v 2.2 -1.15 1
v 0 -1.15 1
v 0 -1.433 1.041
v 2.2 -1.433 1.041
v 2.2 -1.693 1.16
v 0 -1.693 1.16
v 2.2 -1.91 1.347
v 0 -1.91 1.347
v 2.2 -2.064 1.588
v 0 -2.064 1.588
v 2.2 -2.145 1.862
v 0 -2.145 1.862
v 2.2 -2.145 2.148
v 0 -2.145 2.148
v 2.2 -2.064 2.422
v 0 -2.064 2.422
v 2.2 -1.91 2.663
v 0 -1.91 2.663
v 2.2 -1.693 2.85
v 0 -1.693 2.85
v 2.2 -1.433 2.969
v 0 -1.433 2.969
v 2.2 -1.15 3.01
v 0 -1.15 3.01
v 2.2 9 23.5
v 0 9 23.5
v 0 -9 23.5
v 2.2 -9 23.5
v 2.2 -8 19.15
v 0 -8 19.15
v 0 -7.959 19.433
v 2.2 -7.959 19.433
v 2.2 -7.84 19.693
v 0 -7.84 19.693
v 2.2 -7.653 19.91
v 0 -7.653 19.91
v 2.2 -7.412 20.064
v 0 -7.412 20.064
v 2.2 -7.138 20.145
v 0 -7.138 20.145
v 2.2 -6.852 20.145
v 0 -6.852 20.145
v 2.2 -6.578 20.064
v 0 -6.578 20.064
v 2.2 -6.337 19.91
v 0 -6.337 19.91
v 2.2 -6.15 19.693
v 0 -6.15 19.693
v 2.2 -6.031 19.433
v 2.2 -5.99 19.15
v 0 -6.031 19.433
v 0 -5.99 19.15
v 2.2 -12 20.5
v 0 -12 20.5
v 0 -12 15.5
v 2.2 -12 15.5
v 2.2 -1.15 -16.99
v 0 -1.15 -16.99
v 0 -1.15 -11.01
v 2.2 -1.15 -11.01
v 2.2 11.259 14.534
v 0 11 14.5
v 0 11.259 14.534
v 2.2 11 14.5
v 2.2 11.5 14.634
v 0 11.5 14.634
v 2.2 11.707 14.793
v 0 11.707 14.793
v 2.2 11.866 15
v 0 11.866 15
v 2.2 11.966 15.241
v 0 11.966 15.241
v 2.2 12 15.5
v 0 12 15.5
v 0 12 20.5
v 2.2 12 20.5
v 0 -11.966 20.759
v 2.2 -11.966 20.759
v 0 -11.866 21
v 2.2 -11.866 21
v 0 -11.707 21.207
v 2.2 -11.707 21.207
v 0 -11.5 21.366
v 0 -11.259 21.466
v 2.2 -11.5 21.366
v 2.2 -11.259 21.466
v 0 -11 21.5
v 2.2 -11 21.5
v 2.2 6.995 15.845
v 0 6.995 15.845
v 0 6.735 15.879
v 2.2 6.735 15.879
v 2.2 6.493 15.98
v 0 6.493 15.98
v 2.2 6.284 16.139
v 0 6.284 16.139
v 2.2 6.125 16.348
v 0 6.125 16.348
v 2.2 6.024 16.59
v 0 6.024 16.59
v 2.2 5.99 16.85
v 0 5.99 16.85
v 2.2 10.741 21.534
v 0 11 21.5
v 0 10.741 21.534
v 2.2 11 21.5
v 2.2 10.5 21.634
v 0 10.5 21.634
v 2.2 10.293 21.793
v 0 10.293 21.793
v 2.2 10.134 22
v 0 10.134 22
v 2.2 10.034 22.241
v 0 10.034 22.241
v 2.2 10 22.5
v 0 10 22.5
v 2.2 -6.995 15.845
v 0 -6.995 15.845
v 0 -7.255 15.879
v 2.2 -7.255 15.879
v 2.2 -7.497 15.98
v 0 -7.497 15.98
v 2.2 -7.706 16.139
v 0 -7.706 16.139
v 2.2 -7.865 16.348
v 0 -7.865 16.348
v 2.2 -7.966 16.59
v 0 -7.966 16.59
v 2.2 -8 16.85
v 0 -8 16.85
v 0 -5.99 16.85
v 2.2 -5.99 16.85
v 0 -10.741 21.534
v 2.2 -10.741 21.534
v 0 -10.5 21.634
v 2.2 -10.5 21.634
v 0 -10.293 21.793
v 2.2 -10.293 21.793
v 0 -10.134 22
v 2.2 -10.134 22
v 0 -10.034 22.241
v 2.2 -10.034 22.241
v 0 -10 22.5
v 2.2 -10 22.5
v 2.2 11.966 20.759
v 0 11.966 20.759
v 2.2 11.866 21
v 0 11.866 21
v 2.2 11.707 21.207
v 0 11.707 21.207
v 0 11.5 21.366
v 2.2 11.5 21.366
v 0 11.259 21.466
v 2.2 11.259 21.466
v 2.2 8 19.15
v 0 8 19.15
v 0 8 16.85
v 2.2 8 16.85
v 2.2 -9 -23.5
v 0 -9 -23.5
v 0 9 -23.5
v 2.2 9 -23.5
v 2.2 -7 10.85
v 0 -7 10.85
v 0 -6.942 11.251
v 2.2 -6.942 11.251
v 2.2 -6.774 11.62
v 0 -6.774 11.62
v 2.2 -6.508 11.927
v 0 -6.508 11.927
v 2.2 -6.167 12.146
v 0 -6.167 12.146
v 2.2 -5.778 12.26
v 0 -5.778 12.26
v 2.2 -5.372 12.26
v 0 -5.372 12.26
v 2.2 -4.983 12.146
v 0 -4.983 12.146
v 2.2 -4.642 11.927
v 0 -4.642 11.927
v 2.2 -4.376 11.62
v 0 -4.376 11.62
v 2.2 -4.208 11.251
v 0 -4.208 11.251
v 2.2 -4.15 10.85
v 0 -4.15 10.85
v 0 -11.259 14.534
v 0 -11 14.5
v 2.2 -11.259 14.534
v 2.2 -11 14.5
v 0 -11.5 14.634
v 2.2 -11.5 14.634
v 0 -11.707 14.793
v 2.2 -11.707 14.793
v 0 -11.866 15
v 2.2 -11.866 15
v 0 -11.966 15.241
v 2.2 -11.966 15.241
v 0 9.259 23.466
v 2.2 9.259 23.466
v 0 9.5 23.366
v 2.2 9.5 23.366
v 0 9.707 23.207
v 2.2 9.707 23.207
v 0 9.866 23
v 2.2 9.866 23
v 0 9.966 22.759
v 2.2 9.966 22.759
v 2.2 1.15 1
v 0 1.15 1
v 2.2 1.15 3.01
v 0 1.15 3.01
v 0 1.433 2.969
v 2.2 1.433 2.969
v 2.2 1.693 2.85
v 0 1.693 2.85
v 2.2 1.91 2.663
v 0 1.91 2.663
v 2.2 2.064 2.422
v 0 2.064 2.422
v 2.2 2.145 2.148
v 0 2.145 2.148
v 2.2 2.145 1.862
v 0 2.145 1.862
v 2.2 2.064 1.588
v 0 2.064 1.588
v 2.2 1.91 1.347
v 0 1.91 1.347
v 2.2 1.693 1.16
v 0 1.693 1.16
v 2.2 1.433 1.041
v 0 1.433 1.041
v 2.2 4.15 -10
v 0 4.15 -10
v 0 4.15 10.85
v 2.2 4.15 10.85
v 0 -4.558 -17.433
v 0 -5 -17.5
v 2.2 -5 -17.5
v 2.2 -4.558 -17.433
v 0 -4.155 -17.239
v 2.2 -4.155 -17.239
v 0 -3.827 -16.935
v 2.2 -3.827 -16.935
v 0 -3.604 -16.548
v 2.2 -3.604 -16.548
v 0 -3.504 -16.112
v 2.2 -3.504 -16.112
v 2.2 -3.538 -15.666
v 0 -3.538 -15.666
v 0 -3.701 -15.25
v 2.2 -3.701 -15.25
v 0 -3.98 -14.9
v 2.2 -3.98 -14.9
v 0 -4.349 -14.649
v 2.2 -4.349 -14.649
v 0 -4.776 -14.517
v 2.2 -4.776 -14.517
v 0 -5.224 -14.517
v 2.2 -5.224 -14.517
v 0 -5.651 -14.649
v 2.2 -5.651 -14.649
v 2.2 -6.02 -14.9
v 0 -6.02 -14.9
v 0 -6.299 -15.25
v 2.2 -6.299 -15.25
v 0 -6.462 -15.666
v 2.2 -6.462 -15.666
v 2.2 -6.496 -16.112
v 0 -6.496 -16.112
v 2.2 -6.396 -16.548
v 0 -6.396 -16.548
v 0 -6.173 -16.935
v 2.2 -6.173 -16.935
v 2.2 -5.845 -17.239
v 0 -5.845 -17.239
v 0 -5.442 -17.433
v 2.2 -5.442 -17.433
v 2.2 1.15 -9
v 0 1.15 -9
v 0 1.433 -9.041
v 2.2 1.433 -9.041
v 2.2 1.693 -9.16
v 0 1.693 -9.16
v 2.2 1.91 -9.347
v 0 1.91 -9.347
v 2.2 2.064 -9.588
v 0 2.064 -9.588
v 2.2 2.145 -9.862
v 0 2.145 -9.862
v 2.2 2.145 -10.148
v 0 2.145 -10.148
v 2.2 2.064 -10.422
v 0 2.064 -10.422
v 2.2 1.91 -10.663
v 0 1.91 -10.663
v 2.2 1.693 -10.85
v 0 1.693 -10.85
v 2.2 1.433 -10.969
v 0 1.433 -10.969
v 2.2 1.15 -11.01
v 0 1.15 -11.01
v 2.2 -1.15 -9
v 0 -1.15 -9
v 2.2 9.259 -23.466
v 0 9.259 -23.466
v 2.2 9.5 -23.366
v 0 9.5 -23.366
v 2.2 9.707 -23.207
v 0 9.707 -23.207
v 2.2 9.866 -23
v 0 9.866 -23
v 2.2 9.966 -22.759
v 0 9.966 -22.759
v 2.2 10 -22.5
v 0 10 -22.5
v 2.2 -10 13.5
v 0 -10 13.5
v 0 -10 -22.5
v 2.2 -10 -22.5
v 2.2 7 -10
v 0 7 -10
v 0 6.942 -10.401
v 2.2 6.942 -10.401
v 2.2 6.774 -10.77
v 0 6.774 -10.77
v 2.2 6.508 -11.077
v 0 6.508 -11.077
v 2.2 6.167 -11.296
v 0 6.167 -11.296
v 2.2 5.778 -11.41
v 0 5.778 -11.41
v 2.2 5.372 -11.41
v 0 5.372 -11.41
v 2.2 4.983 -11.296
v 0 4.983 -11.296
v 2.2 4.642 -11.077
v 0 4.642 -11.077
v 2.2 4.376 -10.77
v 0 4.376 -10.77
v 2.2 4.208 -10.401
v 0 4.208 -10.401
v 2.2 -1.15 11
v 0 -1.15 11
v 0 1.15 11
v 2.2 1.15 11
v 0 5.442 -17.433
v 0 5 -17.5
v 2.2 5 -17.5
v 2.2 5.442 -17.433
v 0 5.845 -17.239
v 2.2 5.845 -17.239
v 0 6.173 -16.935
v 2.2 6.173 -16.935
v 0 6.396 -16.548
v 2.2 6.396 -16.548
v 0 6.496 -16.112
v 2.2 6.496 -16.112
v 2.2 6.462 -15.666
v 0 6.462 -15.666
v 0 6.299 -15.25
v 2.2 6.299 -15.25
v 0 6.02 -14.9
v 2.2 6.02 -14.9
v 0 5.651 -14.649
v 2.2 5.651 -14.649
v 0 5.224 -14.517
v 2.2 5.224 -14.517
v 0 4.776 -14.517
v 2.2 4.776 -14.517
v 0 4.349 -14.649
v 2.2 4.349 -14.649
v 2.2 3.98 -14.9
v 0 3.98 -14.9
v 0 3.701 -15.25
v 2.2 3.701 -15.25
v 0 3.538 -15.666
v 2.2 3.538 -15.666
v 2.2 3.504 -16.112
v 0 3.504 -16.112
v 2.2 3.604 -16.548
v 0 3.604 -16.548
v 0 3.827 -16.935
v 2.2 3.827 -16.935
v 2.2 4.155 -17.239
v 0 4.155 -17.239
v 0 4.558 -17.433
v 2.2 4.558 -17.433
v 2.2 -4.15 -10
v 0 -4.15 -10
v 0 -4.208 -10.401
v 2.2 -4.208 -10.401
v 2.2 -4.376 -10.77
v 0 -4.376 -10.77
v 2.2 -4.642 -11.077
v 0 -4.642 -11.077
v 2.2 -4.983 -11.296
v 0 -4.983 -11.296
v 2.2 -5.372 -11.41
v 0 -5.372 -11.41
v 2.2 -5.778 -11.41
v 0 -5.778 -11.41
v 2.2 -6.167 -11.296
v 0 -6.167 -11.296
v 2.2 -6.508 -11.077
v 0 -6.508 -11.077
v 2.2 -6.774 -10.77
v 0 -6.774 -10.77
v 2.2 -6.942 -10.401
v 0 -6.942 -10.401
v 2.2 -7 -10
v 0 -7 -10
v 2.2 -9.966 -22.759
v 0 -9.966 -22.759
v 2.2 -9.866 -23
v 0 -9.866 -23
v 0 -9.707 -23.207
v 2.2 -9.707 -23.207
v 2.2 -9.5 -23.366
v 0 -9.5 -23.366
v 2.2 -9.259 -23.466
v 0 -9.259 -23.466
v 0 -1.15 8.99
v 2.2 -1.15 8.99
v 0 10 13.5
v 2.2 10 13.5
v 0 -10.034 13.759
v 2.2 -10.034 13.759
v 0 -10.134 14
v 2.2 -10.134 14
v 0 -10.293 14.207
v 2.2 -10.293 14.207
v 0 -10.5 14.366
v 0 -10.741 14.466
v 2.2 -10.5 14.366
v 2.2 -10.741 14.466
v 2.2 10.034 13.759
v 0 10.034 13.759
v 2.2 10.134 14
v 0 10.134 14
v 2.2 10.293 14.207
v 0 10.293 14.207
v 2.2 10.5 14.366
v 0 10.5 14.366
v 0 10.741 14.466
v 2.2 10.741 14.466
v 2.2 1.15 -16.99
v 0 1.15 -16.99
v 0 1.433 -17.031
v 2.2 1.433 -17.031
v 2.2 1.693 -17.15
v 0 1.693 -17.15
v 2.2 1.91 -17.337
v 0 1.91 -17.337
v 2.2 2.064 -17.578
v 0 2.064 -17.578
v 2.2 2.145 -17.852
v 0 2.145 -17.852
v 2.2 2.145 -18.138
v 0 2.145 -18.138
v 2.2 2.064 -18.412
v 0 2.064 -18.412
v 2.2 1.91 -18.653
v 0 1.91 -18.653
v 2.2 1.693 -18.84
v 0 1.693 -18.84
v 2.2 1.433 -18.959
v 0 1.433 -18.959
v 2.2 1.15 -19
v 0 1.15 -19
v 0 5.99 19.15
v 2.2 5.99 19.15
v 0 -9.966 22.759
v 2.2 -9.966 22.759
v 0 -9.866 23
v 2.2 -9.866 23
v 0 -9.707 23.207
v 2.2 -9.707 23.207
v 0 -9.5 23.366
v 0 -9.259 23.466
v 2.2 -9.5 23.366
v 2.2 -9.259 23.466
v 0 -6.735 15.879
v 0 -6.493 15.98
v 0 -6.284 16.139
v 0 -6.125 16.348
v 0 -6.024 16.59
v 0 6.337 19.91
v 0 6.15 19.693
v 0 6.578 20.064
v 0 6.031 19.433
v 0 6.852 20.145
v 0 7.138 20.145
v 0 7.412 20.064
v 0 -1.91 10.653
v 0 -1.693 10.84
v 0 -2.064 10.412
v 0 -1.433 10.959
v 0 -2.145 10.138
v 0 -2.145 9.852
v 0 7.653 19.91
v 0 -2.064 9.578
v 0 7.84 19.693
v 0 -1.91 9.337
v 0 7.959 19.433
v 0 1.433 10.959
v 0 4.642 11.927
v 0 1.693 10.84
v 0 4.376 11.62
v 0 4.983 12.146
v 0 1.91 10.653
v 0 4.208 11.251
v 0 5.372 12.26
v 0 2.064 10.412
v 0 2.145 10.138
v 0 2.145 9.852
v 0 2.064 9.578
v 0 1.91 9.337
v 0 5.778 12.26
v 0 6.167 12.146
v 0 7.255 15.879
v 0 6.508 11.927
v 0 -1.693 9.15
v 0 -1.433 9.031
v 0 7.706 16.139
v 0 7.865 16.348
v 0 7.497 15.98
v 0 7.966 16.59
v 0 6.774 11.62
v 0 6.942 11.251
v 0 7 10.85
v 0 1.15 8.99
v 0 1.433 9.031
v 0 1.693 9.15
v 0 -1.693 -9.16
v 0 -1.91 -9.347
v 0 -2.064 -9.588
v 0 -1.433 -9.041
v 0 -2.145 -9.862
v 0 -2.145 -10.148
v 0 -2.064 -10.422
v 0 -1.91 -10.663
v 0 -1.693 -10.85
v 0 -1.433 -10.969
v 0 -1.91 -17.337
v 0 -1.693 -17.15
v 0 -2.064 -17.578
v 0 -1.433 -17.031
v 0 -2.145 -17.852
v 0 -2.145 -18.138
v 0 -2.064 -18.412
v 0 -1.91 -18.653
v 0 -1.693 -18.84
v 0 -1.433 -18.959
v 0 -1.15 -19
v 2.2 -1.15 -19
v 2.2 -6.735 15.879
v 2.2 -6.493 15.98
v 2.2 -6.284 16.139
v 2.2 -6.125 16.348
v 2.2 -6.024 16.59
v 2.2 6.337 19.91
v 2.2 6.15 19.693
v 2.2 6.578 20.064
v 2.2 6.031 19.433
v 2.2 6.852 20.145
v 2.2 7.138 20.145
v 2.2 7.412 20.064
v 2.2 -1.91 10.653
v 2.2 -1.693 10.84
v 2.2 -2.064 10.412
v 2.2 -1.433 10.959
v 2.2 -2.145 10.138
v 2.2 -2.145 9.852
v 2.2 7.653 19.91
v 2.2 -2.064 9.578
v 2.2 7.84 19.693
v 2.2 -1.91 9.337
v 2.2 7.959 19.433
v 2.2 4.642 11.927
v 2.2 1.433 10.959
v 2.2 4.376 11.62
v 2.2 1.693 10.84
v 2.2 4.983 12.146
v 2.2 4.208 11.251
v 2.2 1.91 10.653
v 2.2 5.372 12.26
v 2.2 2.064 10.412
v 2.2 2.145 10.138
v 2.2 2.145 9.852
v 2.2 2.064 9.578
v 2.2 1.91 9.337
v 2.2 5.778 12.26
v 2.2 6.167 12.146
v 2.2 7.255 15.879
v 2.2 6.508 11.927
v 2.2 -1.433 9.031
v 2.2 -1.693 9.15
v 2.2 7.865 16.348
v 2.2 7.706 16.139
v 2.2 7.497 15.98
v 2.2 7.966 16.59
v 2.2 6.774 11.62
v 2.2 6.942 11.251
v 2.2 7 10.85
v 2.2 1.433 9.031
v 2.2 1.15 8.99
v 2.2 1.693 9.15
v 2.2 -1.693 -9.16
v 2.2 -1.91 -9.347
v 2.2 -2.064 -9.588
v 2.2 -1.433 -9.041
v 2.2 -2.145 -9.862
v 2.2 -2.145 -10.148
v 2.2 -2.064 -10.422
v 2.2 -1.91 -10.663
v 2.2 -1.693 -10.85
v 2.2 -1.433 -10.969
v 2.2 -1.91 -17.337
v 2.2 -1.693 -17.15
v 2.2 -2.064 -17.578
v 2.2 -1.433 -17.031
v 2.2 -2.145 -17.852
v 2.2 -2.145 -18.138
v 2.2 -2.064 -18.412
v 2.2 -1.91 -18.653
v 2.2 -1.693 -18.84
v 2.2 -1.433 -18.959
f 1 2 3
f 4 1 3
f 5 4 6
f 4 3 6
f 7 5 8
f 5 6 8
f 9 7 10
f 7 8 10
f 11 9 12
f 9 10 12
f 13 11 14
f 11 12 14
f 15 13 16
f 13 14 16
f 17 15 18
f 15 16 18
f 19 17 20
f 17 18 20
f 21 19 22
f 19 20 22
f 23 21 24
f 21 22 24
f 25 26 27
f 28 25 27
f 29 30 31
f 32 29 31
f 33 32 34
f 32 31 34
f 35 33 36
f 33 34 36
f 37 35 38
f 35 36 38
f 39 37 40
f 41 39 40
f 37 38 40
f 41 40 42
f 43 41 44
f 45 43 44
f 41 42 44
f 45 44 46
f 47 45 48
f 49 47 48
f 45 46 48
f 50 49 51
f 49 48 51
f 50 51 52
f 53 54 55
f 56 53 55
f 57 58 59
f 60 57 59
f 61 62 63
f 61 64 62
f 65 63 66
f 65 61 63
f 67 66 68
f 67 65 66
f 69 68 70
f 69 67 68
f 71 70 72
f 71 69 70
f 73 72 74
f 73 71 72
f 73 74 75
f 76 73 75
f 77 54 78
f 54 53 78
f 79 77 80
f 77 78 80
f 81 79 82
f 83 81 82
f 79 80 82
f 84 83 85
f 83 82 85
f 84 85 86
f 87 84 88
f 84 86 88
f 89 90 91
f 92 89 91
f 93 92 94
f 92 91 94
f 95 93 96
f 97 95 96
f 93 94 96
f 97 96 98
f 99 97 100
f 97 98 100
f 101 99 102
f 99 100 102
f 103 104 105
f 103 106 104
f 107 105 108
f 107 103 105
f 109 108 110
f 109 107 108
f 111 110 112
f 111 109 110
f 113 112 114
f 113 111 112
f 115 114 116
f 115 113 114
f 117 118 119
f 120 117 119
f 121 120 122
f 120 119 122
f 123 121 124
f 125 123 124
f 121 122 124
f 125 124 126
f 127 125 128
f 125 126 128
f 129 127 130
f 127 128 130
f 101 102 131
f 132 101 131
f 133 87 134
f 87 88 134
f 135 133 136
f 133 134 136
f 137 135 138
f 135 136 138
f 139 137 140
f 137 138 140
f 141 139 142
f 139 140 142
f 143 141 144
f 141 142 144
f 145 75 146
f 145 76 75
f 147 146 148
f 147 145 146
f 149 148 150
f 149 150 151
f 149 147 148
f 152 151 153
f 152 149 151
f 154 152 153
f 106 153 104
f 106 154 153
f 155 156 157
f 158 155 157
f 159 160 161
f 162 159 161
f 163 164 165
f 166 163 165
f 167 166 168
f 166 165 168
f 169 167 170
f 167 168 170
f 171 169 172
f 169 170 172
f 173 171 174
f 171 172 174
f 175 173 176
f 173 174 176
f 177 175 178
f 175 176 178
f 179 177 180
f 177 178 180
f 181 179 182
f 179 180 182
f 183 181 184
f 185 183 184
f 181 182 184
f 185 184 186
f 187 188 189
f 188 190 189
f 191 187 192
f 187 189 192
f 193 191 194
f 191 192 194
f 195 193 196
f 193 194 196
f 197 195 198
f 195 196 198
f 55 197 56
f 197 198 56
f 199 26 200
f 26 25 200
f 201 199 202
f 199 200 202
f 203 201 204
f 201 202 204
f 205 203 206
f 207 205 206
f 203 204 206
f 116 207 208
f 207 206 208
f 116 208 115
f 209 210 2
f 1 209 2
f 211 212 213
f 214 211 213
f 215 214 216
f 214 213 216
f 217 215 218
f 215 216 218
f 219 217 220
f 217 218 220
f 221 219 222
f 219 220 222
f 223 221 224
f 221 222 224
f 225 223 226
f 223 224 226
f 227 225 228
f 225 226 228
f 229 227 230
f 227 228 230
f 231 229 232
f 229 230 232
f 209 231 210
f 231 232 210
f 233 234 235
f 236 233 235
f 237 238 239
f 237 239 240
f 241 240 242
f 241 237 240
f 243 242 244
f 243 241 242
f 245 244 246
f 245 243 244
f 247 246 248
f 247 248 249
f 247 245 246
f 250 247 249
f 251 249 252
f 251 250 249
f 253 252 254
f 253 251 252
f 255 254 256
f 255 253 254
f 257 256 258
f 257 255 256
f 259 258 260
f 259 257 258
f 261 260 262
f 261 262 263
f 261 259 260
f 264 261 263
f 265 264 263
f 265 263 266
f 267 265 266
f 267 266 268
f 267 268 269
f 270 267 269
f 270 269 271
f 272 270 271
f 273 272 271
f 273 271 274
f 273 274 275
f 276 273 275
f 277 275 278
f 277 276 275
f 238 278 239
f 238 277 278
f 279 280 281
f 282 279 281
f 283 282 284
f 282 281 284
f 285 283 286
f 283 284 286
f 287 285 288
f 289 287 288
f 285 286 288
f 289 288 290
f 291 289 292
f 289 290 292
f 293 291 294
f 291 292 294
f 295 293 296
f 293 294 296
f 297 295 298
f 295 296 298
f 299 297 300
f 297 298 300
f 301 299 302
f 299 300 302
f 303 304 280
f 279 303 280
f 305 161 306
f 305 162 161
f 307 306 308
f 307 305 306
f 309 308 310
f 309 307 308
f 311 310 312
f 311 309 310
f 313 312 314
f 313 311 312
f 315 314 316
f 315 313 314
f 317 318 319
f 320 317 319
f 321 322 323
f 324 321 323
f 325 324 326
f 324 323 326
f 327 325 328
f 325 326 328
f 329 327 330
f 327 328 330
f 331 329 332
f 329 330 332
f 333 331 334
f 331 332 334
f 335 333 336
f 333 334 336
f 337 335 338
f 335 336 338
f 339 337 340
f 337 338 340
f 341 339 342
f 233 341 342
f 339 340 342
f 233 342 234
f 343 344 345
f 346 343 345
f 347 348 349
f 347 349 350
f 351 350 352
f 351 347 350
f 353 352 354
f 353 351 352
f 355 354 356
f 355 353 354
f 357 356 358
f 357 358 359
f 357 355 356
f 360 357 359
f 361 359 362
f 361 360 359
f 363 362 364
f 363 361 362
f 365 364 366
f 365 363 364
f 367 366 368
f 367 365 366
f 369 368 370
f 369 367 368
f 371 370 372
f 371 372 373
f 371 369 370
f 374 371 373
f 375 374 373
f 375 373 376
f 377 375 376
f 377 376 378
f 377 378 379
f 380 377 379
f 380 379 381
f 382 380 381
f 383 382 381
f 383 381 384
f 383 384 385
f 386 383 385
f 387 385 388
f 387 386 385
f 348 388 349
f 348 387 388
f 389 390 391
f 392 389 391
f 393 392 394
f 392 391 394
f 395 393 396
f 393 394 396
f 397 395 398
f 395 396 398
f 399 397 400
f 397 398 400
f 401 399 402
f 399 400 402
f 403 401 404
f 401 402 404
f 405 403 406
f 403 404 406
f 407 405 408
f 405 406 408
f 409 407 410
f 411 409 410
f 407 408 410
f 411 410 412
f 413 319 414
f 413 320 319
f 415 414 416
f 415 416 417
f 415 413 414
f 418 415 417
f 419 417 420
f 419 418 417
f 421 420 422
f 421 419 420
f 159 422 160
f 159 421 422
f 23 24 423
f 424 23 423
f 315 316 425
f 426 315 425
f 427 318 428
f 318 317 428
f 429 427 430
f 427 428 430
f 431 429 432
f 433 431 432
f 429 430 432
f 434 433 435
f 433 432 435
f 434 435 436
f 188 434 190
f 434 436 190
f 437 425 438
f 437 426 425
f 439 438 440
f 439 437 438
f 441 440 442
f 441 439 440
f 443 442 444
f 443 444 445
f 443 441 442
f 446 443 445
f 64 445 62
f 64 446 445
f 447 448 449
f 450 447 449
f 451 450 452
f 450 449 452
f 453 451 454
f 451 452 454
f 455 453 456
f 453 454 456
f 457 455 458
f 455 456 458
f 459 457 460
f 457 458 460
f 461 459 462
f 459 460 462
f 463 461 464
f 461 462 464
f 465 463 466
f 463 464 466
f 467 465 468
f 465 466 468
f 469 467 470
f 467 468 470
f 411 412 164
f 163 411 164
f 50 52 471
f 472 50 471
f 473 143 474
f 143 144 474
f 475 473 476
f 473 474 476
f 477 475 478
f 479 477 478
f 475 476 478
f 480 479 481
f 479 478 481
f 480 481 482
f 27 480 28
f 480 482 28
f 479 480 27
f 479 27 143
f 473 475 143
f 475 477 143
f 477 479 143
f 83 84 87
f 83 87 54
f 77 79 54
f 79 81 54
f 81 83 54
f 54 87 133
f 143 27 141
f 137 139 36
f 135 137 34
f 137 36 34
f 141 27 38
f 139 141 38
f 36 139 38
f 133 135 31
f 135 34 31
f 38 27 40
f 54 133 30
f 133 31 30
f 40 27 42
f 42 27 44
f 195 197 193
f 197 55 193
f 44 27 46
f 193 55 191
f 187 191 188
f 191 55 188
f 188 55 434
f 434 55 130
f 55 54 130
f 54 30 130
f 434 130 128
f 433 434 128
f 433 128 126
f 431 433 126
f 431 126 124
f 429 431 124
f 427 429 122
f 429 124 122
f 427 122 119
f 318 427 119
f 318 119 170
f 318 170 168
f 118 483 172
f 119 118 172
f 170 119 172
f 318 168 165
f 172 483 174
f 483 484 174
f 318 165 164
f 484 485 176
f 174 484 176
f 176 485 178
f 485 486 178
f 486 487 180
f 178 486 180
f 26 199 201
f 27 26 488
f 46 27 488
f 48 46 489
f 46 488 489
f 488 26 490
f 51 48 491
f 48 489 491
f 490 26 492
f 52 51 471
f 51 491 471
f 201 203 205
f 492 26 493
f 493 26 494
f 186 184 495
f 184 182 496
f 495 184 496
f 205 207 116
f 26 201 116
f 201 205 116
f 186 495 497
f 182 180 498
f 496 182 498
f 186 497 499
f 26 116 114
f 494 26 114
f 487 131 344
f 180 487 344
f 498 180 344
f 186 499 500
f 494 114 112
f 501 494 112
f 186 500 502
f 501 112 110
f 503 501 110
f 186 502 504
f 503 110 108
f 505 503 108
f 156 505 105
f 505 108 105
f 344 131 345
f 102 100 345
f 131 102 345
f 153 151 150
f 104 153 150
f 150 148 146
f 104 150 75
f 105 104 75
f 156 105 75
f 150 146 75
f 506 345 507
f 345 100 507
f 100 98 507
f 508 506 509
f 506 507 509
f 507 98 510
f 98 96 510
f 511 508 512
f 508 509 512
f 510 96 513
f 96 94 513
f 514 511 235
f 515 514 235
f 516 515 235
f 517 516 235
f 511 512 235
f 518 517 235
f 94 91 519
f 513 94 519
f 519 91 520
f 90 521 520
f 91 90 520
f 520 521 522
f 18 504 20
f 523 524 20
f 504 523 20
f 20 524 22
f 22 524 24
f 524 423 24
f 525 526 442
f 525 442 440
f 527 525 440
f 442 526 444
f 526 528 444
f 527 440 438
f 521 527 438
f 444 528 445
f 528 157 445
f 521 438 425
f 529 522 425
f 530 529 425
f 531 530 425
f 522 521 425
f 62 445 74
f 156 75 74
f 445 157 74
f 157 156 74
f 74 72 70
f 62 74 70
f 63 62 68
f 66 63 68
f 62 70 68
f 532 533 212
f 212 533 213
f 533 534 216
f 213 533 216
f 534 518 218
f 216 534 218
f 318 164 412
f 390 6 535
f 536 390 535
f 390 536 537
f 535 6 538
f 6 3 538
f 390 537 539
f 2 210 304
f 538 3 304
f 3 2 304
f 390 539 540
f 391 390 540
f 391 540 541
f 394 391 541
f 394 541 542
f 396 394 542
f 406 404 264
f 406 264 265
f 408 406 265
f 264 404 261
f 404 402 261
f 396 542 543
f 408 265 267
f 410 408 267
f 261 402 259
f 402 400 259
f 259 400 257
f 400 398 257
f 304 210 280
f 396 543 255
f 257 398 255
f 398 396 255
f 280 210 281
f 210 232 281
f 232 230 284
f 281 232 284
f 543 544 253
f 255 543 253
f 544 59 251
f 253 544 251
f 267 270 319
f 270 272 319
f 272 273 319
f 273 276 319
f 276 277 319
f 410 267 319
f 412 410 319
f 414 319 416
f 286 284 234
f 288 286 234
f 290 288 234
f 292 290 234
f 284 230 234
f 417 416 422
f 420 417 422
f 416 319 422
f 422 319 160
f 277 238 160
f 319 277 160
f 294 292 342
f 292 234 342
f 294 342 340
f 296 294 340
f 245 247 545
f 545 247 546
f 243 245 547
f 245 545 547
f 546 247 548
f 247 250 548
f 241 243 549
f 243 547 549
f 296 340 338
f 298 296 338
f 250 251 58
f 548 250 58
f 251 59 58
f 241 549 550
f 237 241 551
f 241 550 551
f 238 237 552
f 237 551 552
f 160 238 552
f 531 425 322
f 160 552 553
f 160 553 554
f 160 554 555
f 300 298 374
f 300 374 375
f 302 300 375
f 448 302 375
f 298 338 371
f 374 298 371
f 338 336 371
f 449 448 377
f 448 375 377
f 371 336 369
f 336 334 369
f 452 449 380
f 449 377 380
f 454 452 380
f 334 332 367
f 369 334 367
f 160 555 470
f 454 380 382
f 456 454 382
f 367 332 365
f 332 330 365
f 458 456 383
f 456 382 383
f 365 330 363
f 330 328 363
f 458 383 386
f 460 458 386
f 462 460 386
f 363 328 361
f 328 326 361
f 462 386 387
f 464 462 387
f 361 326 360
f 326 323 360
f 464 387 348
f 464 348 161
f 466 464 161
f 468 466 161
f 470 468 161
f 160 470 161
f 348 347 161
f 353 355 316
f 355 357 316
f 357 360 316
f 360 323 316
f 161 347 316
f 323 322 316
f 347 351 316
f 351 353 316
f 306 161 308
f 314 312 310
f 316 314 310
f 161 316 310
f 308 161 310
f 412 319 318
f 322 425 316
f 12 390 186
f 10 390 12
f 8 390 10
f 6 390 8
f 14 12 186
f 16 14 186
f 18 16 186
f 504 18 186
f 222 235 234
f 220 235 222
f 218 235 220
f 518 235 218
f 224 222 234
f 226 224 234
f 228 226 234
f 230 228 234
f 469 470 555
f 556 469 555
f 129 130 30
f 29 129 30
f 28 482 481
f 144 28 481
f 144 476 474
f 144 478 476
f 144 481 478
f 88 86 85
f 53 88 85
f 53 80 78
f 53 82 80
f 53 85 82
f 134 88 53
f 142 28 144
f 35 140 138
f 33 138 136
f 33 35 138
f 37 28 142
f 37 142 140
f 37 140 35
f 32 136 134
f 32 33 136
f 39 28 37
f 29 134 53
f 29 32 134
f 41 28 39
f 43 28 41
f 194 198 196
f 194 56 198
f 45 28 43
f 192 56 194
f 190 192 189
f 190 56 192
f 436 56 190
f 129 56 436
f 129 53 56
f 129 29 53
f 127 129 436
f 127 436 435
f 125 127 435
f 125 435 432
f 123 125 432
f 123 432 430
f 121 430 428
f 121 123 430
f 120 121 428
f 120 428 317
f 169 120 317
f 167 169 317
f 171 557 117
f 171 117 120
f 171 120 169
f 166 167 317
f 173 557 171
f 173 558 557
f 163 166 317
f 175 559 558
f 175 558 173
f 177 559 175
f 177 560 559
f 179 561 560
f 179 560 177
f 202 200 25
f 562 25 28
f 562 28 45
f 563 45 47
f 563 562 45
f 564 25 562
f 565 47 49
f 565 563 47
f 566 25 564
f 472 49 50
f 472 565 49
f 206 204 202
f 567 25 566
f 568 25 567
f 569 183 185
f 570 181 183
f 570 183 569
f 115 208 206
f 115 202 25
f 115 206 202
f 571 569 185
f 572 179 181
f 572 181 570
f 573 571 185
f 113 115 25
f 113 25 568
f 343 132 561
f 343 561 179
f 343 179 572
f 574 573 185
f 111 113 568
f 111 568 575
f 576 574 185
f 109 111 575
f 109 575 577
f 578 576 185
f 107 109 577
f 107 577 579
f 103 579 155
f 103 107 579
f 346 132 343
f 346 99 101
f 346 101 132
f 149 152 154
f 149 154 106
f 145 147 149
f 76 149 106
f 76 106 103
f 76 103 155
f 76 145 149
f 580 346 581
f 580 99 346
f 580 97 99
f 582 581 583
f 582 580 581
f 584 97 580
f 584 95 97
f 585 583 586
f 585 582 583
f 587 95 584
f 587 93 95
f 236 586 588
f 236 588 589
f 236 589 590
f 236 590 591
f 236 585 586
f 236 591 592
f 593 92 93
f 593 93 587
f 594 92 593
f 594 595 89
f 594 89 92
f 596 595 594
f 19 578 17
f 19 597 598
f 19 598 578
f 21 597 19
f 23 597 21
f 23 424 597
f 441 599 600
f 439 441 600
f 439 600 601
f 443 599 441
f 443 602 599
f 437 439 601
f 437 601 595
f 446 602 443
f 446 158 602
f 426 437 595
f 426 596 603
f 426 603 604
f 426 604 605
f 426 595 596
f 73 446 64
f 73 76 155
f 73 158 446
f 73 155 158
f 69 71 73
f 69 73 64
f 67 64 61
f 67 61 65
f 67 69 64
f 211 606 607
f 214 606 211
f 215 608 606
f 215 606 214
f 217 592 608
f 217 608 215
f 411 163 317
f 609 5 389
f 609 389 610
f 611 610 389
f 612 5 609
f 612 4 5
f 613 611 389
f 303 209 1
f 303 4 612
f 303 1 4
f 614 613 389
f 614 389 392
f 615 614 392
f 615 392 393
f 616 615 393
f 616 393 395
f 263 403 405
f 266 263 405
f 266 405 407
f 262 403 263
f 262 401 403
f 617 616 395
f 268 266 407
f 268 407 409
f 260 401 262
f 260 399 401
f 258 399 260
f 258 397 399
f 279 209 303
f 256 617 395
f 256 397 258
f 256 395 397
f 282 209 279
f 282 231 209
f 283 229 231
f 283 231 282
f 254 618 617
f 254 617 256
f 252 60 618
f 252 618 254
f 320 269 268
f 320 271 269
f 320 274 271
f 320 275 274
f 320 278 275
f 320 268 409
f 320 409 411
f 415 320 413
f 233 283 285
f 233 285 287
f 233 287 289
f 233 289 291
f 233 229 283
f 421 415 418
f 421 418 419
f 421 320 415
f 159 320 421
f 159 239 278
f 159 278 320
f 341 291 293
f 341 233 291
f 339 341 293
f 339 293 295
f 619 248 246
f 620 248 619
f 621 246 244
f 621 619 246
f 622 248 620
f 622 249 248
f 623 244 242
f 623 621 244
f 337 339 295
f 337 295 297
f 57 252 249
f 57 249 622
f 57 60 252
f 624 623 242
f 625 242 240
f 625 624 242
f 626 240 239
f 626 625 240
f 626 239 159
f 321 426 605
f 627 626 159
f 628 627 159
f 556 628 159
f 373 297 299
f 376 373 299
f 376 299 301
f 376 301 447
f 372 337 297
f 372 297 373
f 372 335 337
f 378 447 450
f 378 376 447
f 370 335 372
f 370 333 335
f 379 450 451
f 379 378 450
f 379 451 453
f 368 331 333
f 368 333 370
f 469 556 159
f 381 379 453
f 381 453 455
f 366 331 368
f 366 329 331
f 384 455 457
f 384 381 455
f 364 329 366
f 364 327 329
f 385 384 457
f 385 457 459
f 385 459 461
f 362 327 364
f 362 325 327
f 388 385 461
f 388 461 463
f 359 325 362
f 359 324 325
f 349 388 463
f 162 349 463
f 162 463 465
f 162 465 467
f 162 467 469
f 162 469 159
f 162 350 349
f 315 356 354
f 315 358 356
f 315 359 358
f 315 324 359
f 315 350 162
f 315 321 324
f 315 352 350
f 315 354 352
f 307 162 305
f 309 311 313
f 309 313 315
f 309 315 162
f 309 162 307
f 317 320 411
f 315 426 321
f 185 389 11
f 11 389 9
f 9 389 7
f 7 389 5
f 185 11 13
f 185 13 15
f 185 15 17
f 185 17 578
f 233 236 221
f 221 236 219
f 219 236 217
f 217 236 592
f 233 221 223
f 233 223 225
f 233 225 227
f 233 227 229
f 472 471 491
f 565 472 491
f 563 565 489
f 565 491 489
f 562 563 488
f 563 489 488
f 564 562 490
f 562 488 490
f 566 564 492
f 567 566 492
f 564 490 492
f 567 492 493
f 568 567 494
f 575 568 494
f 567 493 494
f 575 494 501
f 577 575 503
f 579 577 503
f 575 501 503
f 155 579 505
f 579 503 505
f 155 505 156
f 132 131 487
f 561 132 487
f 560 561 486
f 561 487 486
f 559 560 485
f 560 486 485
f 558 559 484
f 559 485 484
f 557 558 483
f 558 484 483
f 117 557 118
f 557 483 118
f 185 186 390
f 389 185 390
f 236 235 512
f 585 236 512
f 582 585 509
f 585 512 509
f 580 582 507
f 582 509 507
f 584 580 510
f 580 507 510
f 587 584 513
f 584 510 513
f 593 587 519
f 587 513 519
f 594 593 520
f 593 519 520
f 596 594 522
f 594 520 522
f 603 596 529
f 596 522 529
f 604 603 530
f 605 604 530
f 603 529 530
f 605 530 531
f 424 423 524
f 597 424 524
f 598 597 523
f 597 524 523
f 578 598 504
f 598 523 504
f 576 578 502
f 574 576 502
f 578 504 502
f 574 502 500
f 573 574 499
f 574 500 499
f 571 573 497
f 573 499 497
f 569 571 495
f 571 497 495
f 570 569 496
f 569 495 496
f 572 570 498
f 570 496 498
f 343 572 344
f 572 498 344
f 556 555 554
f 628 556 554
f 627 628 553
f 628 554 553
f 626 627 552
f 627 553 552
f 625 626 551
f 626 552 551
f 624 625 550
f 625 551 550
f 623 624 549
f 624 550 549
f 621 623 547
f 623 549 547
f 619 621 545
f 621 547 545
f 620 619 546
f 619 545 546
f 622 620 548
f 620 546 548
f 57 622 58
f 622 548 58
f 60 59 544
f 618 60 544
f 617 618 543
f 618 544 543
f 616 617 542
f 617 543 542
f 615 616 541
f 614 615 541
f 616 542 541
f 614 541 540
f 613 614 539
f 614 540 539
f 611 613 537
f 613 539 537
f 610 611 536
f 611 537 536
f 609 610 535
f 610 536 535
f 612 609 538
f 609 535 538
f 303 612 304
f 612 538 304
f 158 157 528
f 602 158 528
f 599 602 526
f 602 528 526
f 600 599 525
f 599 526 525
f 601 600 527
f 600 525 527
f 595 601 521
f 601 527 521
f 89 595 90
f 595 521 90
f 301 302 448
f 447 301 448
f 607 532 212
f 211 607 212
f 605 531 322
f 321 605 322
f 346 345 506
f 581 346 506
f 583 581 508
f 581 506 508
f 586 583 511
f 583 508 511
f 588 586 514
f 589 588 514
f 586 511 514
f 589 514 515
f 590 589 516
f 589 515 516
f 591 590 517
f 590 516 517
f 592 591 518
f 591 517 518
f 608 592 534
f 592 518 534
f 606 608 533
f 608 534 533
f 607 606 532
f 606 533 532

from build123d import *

# Parameters (mm, degrees)
SKETCH_1_R      = 1.5
EXTRUDE_1_DEPTH = 2.2
FILLET_1_R      = 1


with BuildPart() as part:
    # 草图1 → 凸台-拉伸1 (new body)
    with BuildSketch(Plane(origin=(0, 0, 0), x_dir=(0, 0, -1), z_dir=(1, 0, 0))):
        Polygon((-14.5, -10), (23.5, -10), (23.5, 10), (-14.5, 10), (-14.5, 12), (-21.5, 12), (-21.5, 10), (-23.5, 10), (-23.5, -10), (-21.5, -10), (-21.5, -12), (-14.5, -12), align=None)
        with BuildLine():
            ThreePointArc((-15.845, -6.995), (-16.139357685, -7.705642315), (-16.85, -8))
            Line((-16.85, -8), (-19.15, -8))
            ThreePointArc((-19.15, -8), (-20.155, -6.995), (-19.15, -5.99))
            Line((-19.15, -5.99), (-19.15, 5.99))
            ThreePointArc((-19.15, 5.99), (-20.155, 6.995), (-19.15, 8))
            Line((-19.15, 8), (-16.85, 8))
            ThreePointArc((-16.85, 8), (-16.139357685, 7.705642315), (-15.845, 6.995))
            ThreePointArc((-15.845, 6.995), (-16.139357685, 6.284357685), (-16.85, 5.99))
            Line((-16.85, 5.99), (-16.85, -5.99))
            ThreePointArc((-16.85, -5.99), (-16.139357685, -6.284357685), (-15.845, -6.995))
        make_face(mode=Mode.SUBTRACT)
        with BuildLine():
            Line((10, -7), (-10.85, -7))
            ThreePointArc((-10.85, -7), (-12.275, -5.575), (-10.85, -4.15))
            Line((-10.85, -4.15), (10, -4.15))
            ThreePointArc((10, -4.15), (11.425, -5.575), (10, -7))
        make_face(mode=Mode.SUBTRACT)
        with BuildLine():
            Line((-3.01, -1.15), (-8.99, -1.15))
            ThreePointArc((-8.99, -1.15), (-9.995, -2.155), (-11, -1.15))
            Line((-11, -1.15), (-11, 1.15))
            ThreePointArc((-11, 1.15), (-9.995, 2.155), (-8.99, 1.15))
            Line((-8.99, 1.15), (-3.01, 1.15))
            ThreePointArc((-3.01, 1.15), (-2.005, 2.155), (-1, 1.15))
            Line((-1, 1.15), (-1, -1.15))
            ThreePointArc((-1, -1.15), (-2.005, -2.155), (-3.01, -1.15))
        make_face(mode=Mode.SUBTRACT)
        with Locations((16, -5)):
            Circle(SKETCH_1_R, mode=Mode.SUBTRACT)
        with BuildLine():
            ThreePointArc((-10.85, 4.15), (-12.275, 5.575), (-10.85, 7))
            Line((-10.85, 7), (10, 7))
            ThreePointArc((10, 7), (11.425, 5.575), (10, 4.15))
            Line((10, 4.15), (-10.85, 4.15))
        make_face(mode=Mode.SUBTRACT)
        with BuildLine():
            Line((16.99, -1.15), (11.01, -1.15))
            ThreePointArc((11.01, -1.15), (10.005, -2.155), (9, -1.15))
            Line((9, -1.15), (9, 1.15))
            ThreePointArc((9, 1.15), (10.005, 2.155), (11.01, 1.15))
            Line((11.01, 1.15), (16.99, 1.15))
            ThreePointArc((16.99, 1.15), (17.995, 2.155), (19, 1.15))
            Line((19, 1.15), (19, -1.15))
            ThreePointArc((19, -1.15), (17.995, -2.155), (16.99, -1.15))
        make_face(mode=Mode.SUBTRACT)
        with Locations((16, 5)):
            Circle(SKETCH_1_R, mode=Mode.SUBTRACT)
    extrude(amount=EXTRUDE_1_DEPTH)

    # 圆角1
    fillet_1_edges = [part.edges().sort_by_distance(p)[0] for p in [
        (1.1, -10, 23.5),
        (1.1, 10, 23.5),
        (1.1, 12, 14.5),
        (1.1, 10, 14.5),
        (1.1, 10, -23.5),
        (1.1, -10, -23.5),
        (1.1, -10, 14.5),
        (1.1, -12, 14.5),
        (1.1, -12, 21.5),
        (1.1, -10, 21.5),
        (1.1, 12, 21.5),
        (1.1, 10, 21.5),
    ]]
    fillet(fillet_1_edges, radius=FILLET_1_R - 0.0001)  # a hair under: the kernel refuses the full size


solid = part.part
